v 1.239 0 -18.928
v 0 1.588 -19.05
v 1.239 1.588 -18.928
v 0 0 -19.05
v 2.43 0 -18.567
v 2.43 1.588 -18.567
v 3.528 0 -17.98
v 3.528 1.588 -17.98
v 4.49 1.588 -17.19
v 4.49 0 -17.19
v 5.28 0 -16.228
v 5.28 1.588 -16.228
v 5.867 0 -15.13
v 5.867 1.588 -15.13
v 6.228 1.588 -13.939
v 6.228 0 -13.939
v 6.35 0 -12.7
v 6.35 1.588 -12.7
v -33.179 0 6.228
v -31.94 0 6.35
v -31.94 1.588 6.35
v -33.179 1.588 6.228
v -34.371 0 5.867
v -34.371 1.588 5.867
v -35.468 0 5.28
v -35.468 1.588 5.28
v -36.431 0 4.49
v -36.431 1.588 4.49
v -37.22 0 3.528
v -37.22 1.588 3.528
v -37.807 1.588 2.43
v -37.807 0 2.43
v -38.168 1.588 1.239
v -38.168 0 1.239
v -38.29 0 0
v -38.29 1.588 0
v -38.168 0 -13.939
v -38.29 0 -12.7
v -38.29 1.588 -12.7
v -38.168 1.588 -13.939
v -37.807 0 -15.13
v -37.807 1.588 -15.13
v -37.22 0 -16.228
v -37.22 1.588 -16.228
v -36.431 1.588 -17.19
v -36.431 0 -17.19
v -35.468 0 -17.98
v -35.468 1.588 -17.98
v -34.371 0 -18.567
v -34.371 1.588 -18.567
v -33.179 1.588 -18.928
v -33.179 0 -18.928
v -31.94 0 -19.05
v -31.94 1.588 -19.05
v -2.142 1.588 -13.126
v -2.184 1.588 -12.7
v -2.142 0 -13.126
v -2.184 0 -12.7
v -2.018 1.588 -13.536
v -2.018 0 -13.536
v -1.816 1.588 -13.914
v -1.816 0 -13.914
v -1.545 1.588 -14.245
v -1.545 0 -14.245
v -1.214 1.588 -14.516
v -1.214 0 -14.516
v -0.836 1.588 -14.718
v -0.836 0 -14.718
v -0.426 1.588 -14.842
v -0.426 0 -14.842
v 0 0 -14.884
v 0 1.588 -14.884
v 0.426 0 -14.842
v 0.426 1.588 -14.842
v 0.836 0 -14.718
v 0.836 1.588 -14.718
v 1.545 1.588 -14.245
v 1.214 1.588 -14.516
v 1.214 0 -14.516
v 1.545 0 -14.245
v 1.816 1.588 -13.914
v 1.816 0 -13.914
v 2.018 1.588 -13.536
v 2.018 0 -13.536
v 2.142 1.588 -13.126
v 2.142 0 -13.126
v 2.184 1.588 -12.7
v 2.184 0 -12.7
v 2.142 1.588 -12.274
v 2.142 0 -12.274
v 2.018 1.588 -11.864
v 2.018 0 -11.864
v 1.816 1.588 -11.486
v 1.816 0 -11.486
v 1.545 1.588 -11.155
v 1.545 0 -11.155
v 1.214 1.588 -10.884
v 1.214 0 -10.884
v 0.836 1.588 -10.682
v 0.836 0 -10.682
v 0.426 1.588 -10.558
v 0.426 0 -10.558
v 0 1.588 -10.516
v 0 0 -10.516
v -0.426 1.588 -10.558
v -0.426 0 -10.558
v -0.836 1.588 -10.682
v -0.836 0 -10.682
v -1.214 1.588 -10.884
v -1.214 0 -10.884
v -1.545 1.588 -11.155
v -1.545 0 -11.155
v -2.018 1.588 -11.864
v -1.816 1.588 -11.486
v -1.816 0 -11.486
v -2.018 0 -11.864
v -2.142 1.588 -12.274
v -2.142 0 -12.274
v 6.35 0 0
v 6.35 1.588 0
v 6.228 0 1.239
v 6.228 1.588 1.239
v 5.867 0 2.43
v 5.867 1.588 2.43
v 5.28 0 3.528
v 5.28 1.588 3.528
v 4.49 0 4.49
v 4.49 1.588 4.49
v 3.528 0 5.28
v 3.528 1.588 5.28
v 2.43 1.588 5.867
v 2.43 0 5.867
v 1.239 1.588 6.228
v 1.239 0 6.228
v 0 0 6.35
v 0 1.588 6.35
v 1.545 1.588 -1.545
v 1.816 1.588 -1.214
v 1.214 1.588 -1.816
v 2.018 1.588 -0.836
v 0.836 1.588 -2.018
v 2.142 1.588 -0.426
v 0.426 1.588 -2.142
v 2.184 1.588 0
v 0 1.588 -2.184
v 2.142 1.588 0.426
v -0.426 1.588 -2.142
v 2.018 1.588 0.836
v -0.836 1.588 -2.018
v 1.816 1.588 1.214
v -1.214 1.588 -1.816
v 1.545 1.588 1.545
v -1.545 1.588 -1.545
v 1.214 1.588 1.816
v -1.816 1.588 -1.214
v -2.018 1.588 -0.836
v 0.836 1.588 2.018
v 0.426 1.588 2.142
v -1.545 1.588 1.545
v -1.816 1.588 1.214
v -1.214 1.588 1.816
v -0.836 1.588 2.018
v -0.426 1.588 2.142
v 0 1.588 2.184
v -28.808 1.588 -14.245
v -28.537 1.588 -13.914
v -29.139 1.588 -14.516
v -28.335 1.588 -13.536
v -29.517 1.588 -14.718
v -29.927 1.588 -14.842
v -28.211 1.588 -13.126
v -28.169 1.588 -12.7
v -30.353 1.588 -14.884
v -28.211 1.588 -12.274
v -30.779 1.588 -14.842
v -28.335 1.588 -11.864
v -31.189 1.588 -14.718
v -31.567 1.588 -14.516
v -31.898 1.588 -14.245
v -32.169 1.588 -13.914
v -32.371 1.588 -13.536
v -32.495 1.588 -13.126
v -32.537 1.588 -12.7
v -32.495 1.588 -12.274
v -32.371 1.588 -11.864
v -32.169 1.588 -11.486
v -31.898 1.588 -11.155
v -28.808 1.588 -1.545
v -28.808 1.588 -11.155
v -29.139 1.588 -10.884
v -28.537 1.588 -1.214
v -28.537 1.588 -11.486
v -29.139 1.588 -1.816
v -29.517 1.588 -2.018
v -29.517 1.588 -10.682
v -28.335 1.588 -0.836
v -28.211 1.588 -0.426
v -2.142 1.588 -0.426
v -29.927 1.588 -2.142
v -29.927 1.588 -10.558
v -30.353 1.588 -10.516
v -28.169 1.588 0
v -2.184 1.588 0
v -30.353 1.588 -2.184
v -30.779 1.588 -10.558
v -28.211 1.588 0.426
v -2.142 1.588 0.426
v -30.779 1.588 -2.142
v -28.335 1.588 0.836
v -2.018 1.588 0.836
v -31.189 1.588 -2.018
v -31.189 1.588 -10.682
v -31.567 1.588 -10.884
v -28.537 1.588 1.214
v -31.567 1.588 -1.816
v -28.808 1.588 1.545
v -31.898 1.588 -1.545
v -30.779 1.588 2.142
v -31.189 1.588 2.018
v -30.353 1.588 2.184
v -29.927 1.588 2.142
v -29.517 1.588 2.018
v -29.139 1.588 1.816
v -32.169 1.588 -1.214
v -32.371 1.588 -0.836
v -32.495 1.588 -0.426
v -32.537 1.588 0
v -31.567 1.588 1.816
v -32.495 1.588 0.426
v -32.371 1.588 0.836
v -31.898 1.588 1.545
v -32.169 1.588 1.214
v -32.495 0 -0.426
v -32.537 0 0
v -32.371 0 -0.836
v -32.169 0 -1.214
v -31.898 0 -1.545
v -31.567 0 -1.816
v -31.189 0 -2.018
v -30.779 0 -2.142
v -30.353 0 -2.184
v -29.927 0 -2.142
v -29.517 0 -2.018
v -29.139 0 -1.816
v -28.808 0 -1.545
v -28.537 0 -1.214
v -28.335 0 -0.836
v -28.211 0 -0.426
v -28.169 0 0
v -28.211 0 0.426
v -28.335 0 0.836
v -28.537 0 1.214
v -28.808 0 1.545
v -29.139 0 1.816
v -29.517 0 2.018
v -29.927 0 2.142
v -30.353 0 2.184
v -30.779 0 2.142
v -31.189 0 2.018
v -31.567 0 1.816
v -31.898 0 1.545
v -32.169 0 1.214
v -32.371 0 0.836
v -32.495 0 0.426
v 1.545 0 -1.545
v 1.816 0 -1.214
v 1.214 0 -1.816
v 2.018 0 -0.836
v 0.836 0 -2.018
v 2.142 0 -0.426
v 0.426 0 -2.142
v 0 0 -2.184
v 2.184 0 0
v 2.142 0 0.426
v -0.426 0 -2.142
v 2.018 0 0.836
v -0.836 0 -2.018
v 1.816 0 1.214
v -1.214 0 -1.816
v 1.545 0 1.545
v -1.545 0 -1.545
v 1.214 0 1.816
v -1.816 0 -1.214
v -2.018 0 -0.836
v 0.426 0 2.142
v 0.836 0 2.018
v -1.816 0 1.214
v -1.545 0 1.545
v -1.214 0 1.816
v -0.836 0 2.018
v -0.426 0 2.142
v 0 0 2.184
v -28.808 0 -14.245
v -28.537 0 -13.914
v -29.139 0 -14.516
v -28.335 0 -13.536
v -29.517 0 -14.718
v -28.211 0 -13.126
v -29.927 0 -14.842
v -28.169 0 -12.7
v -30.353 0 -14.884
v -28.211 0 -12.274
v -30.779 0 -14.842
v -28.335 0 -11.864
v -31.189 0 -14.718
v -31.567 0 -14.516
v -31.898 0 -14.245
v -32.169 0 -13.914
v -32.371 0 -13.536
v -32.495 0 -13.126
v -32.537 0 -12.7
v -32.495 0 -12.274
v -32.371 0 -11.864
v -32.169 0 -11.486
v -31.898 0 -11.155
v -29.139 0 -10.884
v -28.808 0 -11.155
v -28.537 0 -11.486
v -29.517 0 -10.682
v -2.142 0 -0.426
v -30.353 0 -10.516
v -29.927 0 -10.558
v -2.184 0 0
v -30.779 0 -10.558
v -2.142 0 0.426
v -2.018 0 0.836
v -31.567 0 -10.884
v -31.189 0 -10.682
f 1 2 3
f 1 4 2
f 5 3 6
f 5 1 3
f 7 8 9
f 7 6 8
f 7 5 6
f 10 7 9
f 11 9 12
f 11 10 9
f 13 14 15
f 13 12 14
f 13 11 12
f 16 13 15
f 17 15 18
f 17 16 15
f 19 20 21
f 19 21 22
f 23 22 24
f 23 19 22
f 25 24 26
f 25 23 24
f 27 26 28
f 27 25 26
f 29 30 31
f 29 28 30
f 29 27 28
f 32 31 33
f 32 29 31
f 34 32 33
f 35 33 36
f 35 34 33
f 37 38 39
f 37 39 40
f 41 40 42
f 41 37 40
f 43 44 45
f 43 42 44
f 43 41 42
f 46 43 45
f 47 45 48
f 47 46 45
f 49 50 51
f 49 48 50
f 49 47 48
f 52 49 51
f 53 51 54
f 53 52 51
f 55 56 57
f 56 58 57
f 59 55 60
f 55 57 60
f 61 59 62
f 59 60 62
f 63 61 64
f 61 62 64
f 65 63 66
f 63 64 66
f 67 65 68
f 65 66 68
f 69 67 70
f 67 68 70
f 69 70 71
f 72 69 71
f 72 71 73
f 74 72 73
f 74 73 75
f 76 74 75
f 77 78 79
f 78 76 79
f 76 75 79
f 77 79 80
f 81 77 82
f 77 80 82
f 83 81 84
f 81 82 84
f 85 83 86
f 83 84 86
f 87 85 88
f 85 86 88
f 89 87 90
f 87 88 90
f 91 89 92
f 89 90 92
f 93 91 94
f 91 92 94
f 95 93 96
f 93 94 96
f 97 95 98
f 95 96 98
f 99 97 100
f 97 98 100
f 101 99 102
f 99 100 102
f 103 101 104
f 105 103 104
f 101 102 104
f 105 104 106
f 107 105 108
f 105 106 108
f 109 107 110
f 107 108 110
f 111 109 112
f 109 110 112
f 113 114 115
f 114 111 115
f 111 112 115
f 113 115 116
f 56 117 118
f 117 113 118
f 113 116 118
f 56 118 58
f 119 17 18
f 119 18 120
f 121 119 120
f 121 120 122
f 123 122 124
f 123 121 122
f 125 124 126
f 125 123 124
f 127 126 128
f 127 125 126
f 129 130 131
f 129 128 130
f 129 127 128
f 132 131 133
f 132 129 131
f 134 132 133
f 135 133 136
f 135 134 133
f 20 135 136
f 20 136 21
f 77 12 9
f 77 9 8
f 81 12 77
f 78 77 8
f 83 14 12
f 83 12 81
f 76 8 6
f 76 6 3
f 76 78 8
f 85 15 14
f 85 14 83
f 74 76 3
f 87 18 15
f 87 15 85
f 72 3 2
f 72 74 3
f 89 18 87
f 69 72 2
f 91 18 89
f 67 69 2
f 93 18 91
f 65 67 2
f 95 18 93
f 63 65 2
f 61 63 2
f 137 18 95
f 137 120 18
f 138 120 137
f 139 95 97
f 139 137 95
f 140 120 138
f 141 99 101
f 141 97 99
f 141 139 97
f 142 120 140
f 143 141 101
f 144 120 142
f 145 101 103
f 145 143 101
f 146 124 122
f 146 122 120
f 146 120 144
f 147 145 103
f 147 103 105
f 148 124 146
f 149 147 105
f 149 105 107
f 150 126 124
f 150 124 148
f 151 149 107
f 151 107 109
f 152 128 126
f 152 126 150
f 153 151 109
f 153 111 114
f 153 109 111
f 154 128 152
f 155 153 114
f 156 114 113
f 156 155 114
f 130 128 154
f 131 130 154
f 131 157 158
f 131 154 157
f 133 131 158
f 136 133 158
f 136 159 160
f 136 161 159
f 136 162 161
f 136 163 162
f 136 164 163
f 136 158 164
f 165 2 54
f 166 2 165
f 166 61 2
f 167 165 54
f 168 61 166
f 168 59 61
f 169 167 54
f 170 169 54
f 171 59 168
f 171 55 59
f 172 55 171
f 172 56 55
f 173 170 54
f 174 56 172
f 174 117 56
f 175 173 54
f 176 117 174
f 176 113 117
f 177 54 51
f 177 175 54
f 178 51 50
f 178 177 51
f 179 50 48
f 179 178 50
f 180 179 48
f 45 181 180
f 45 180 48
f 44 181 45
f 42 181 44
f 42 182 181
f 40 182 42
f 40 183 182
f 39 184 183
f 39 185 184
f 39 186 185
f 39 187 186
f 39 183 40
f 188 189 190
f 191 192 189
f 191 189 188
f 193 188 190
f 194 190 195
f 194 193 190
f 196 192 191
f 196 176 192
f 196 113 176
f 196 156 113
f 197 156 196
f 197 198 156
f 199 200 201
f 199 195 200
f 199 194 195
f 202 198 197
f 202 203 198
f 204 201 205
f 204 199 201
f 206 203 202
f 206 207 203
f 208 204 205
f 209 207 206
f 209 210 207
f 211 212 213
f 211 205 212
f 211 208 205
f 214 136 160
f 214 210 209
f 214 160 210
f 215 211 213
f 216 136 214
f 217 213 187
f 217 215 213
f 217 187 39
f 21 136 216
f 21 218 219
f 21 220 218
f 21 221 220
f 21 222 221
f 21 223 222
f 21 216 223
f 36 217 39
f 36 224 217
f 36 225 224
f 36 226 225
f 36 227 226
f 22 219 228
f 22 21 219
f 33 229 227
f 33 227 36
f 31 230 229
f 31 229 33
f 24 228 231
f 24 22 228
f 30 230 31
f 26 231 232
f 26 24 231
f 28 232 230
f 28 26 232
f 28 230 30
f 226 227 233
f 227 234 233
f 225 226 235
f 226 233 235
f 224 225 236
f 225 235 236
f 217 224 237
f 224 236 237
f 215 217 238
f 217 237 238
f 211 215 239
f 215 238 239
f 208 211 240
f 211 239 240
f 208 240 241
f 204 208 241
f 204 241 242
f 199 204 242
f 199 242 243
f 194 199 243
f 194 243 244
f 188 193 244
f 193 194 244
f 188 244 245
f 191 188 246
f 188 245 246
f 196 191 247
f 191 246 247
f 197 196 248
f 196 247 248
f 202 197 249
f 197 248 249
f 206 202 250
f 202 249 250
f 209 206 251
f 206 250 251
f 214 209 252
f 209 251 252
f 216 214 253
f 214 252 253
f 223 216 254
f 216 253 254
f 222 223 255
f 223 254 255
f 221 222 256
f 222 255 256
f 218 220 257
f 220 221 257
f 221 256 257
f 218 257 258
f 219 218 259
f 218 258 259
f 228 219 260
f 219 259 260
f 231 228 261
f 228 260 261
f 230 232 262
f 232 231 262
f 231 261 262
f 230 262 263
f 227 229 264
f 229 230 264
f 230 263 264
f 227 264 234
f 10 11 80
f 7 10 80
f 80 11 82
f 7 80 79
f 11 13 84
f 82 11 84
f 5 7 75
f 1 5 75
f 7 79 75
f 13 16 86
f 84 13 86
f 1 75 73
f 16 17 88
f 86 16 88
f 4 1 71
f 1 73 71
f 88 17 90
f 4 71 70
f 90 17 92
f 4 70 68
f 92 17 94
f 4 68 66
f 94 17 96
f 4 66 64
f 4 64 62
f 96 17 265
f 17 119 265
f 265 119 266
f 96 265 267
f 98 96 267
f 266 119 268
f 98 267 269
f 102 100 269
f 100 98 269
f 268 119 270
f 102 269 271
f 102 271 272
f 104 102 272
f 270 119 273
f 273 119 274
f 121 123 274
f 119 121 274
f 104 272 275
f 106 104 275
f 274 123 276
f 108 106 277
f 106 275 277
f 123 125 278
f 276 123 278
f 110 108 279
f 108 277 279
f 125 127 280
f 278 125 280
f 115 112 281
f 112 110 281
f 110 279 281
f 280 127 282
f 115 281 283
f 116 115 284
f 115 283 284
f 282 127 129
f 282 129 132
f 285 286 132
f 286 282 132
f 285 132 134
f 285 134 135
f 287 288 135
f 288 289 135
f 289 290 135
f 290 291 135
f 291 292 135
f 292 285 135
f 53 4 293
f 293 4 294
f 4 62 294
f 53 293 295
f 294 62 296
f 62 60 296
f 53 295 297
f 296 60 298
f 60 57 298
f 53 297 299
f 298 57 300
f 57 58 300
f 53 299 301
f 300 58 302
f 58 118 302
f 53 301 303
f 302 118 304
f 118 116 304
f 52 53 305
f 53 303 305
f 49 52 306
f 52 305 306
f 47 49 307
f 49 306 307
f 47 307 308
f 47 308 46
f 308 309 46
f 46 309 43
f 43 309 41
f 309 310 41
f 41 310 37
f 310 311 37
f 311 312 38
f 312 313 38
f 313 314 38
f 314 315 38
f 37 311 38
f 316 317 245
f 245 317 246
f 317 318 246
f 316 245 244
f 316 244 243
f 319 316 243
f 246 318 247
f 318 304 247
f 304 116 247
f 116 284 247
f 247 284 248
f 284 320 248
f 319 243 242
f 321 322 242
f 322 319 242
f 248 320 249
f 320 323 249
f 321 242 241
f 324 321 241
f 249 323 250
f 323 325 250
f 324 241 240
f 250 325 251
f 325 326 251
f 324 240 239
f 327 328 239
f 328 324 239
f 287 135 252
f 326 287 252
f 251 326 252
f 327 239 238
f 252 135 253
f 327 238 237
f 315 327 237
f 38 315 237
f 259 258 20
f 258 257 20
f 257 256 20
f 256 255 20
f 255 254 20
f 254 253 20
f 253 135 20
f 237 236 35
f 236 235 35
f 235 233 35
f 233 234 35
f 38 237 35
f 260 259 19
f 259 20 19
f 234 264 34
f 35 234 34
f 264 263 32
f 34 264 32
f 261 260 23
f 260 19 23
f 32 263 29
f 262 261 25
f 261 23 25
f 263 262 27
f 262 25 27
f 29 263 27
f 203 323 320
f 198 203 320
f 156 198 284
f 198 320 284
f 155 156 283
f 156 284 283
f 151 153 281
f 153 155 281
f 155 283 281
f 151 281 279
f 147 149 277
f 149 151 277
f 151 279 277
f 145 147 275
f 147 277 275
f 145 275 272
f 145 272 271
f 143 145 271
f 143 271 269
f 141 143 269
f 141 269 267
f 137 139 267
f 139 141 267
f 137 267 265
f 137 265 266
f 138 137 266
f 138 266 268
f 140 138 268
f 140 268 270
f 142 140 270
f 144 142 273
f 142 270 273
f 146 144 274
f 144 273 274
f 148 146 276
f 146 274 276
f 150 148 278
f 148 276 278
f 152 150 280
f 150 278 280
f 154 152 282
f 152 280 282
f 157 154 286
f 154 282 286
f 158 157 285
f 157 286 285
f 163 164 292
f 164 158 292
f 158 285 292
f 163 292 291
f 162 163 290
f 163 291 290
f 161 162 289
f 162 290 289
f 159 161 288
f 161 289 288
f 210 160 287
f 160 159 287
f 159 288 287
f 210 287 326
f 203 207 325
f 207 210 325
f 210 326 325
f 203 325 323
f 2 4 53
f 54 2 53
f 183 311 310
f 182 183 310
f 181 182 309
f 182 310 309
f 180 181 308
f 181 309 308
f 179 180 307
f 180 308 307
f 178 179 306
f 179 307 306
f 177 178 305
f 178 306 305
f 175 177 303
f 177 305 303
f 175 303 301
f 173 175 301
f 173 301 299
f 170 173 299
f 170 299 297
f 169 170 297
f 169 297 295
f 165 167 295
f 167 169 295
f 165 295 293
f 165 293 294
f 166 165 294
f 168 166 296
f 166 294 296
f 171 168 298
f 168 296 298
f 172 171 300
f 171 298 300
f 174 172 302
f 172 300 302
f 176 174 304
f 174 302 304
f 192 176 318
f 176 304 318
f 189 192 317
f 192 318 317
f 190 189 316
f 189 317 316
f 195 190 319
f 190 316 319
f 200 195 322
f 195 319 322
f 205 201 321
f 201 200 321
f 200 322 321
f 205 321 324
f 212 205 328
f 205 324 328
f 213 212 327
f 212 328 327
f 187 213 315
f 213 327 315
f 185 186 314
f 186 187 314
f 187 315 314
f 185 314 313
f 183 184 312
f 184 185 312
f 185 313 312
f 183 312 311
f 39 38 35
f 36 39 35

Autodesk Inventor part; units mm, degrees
ref_plane "YZ Plane" through (0, 0, 0) normal (1, 0, 0) x (0, 1, 0)
ref_plane "XZ Plane" through (0, 0, 0) normal (0, 1, 0) x (-1, 0, 0)
ref_plane "XY Plane" through (0, 0, 0) normal (0, 0, 1) x (1, 0, 0)
sketch "Sketch1" plane through (0, 0, 0) normal (0, 1, 0) x (-1, 0, 0)
  circle A0 centre (0, 0) radius 2.1844
  circle A1 centre (30.353, 0) radius 2.1844
  line L0 (0, -12.7) -> (0, 0)
  circle A2 centre (30.353, -12.7) radius 2.1844
  circle A3 centre (0, -12.7) radius 2.1844
  circle A4 centre (0, -12.7) radius 6.35
  circle A5 centre (0, 0) radius 6.35
  line L1 (30.353, -19.05) -> (0, -19.05)
  line L2 (-6.35, -12.7) -> (-6.35, 0)
  line L3 (0, 6.35) -> (30.353, 6.35)
  line L4 (30.353, 0) -> (31.9405, 0)
  circle A6 centre (31.9405, 0) radius 6.35
  circle A7 centre (31.9405, -12.7) radius 6.35
  line L5 (30.353, 6.35) -> (31.9405, 6.35)
  line L6 (30.353, -19.05) -> (31.9405, -19.05)
  line L7 (38.2905, -12.7) -> (38.2905, 0)
  dimension "d0" = 4.3688
  dimension "d2" = 4.3688
  dimension "d4" = 4.3688
  dimension "d5" = 4.3688
  dimension "d8" = 12.7
  dimension "d9" = 12.7
  dimension "d10" = 1.5875
  dimension "d12" = 12.7
  dimension "d13" = 12.7
extrude "Extrusion1" add sketch "Sketch1" along normal blind 1.5875
properties part number "lbgrippermountpoly"
